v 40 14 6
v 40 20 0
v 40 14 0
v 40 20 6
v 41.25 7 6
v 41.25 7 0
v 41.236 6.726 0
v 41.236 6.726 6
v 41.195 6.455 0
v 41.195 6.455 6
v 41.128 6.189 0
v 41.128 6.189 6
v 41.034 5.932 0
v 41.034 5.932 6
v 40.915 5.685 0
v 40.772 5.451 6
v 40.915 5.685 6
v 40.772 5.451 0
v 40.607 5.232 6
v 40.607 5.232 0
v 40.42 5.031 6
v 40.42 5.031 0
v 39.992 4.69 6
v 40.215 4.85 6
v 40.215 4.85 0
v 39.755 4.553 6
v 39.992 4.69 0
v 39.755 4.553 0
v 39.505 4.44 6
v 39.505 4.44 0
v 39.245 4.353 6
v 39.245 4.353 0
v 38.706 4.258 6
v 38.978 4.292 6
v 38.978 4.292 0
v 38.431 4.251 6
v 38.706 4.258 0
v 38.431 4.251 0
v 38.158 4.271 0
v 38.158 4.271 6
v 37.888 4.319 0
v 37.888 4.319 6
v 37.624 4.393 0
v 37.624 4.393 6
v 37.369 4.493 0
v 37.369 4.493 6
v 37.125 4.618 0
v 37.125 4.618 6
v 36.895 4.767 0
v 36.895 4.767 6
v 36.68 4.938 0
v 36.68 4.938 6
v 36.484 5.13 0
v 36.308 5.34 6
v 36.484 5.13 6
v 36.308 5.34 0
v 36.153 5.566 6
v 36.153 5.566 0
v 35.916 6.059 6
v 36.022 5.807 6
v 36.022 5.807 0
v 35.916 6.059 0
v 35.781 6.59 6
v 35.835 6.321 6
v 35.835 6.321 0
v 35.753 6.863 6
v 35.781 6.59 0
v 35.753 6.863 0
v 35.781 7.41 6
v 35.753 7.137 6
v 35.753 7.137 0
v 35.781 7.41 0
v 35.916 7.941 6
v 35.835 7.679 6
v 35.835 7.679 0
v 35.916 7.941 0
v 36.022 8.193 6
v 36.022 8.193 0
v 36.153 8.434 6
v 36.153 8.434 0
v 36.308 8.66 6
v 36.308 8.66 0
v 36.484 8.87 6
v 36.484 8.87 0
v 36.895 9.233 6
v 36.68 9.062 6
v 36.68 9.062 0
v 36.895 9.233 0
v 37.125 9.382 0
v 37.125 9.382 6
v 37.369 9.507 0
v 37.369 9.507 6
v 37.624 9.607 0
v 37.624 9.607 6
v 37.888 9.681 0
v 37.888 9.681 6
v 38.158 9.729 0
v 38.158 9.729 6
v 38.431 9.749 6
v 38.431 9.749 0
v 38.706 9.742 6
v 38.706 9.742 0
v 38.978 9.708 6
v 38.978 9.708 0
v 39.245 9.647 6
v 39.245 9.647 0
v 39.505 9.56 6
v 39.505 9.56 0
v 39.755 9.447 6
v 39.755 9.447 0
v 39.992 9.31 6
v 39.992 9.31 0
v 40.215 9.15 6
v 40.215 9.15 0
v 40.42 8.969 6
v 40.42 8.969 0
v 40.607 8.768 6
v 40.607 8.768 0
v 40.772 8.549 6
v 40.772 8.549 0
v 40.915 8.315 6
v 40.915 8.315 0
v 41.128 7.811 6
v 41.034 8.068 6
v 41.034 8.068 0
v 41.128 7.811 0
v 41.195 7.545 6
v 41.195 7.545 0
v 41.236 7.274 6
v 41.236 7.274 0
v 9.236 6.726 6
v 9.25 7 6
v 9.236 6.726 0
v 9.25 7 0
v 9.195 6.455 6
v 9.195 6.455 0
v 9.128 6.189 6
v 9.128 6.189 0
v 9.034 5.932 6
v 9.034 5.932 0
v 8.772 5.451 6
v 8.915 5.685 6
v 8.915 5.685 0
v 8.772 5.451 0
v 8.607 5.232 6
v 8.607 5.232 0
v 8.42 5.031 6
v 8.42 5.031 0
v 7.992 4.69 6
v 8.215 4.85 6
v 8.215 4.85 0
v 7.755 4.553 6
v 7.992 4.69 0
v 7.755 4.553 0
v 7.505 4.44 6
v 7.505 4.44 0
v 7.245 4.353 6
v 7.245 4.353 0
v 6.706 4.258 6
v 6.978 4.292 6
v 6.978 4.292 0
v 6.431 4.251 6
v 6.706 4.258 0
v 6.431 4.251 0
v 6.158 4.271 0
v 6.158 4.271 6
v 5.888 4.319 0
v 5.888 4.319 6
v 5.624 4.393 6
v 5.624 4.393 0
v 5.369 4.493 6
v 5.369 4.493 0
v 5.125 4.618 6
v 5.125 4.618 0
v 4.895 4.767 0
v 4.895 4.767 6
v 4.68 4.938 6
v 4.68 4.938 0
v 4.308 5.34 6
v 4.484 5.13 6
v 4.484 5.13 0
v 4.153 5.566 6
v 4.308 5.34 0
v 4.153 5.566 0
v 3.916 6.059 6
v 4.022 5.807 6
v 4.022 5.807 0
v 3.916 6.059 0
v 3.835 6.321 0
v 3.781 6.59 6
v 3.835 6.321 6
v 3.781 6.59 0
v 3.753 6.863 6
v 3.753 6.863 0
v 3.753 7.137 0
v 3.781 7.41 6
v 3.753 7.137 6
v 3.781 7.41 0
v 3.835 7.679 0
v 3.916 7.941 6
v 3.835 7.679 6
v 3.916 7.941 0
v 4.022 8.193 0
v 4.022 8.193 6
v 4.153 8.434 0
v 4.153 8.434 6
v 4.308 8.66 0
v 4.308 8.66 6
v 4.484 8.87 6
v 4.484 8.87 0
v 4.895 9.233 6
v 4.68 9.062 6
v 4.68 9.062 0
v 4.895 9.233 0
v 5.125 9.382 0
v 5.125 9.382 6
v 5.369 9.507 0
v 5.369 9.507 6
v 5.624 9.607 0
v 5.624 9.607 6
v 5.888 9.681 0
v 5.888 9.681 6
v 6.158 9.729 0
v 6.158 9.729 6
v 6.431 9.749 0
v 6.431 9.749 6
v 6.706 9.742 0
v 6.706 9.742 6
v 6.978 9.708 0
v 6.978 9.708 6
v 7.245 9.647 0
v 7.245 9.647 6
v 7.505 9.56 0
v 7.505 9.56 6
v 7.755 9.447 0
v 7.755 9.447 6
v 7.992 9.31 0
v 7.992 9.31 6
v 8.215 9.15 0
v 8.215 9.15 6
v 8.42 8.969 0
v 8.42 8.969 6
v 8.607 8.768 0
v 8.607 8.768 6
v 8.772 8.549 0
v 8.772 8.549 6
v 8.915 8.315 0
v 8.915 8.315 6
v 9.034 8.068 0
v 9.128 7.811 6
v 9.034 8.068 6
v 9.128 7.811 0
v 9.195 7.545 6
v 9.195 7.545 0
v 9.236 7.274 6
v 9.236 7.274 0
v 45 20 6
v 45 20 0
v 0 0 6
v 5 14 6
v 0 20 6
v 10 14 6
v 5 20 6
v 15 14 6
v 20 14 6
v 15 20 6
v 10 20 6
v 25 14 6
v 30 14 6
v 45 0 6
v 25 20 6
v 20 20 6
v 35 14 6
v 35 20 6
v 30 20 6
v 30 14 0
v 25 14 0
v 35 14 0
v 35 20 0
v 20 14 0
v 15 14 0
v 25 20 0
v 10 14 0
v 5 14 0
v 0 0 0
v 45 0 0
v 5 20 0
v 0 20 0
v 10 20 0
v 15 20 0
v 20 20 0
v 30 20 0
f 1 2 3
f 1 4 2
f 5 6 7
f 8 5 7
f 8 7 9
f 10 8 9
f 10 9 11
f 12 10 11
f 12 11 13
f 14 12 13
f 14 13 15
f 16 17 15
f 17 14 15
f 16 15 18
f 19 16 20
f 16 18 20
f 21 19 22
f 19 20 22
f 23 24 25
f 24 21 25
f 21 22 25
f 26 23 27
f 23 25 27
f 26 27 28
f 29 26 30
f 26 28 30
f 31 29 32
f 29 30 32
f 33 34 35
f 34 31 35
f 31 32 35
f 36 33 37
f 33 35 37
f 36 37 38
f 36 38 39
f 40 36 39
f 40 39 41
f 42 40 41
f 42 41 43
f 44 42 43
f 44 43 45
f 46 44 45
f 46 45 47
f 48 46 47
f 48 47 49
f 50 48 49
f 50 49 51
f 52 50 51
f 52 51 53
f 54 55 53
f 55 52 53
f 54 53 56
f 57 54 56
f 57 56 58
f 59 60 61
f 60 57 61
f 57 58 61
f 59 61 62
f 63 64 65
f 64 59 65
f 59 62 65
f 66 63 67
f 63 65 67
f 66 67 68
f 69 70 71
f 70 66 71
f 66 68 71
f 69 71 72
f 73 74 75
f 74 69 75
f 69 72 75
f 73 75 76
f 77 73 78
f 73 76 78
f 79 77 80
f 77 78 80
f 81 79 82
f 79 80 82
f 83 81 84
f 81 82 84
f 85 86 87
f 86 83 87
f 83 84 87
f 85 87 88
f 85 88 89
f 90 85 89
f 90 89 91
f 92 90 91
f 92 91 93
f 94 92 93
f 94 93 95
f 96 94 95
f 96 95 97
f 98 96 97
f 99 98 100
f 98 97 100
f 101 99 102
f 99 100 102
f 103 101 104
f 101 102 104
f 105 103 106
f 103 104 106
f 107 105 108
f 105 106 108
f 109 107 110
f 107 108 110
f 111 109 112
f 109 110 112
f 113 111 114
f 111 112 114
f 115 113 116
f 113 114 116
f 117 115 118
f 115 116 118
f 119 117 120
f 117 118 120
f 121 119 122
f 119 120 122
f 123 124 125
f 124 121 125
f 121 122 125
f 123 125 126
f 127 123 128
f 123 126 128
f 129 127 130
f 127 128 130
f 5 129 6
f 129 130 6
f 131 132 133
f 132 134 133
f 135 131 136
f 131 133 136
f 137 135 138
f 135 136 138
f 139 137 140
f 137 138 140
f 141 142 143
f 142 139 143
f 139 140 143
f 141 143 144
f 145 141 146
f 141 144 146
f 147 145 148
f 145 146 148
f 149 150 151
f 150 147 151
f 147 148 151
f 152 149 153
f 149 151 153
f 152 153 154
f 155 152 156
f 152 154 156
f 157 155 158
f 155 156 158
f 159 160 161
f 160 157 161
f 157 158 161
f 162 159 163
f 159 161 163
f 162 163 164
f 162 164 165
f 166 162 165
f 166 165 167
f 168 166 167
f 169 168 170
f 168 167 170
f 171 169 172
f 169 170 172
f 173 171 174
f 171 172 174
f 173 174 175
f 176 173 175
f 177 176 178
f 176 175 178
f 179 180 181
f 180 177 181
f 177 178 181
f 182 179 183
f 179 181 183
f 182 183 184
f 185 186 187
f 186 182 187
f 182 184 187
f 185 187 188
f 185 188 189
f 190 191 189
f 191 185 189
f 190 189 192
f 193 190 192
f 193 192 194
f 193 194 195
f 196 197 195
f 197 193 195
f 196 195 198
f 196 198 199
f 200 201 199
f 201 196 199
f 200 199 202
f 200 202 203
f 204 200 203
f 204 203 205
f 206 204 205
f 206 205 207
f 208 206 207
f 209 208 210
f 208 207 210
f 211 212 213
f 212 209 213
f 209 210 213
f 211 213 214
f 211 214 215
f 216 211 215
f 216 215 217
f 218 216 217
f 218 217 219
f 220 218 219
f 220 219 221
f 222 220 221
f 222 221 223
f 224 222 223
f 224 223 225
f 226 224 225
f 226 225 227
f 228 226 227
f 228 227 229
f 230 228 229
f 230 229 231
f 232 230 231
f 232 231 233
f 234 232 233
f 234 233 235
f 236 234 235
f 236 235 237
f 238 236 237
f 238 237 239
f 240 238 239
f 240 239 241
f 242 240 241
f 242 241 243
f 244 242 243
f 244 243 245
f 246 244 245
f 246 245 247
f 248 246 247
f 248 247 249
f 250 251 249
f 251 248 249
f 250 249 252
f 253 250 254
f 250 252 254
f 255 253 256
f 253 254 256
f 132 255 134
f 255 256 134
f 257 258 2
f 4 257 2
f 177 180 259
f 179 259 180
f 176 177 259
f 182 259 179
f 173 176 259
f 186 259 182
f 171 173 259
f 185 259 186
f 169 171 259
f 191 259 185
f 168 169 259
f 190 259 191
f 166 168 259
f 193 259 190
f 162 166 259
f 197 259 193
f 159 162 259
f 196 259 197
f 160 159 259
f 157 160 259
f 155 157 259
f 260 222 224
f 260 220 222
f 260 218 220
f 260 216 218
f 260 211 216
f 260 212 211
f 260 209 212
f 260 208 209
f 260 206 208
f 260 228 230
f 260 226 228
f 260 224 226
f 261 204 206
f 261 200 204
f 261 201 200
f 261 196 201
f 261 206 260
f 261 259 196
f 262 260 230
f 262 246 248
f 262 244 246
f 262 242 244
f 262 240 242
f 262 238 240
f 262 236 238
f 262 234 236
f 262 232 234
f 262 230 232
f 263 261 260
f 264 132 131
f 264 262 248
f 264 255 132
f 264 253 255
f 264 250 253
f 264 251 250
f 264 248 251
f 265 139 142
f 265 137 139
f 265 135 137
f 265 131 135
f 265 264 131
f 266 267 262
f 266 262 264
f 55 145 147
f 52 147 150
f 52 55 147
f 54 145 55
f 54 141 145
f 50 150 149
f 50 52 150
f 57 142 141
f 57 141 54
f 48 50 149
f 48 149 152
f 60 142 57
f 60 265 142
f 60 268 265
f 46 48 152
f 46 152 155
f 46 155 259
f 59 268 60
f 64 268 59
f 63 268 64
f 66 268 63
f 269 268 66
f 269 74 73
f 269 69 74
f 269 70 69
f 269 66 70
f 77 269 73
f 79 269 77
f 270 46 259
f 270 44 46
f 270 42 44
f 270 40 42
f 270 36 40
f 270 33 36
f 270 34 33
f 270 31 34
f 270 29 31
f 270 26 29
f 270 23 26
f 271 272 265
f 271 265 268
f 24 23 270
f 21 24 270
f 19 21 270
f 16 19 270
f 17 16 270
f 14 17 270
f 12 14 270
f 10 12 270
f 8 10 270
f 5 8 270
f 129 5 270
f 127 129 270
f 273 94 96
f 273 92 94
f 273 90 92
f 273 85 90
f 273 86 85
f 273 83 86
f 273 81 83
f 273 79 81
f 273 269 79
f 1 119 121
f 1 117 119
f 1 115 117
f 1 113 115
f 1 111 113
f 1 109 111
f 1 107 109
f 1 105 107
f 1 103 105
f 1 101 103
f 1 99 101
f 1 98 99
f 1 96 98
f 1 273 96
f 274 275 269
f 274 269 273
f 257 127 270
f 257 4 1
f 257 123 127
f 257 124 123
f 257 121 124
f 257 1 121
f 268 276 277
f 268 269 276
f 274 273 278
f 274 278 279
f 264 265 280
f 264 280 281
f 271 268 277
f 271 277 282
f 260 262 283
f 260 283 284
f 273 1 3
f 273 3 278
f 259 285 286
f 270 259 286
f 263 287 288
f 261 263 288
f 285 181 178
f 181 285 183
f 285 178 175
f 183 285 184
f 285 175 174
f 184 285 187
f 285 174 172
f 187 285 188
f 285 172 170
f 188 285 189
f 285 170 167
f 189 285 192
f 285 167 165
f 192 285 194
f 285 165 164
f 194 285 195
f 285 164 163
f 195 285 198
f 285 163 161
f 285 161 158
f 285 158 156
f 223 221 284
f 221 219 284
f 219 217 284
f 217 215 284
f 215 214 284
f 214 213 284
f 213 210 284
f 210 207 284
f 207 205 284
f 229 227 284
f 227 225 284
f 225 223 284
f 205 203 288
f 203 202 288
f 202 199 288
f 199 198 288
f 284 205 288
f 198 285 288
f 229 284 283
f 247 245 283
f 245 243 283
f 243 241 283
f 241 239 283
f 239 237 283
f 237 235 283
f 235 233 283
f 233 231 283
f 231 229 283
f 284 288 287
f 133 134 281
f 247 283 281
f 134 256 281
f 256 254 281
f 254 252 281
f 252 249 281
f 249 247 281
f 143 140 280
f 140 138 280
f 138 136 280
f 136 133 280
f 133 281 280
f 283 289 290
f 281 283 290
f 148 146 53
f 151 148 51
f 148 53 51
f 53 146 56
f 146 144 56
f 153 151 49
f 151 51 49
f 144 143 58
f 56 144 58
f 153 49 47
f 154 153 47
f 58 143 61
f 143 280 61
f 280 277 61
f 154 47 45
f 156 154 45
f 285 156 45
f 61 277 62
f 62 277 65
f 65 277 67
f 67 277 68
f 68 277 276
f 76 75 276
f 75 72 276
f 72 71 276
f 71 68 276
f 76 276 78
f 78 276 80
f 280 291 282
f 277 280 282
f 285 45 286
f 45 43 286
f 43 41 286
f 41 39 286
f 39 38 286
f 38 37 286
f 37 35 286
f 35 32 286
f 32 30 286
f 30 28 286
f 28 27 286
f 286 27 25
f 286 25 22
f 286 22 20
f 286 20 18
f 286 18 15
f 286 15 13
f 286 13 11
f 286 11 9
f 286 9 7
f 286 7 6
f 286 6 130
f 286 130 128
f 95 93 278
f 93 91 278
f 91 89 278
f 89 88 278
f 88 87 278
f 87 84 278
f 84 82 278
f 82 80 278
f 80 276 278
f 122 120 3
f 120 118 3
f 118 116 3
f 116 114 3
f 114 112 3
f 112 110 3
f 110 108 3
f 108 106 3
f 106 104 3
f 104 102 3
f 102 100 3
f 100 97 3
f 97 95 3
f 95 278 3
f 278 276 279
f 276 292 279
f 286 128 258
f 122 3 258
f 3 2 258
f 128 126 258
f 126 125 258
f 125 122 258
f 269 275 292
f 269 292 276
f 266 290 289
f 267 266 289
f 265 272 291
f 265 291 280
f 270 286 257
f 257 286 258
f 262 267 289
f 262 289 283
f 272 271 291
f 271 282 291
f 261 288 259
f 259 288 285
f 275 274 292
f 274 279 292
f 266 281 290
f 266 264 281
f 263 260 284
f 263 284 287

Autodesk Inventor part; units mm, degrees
ref_plane "YZ Plane" through (0, 0, 0) normal (1, 0, 0) x (0, 1, 0)
ref_plane "XZ Plane" through (0, 0, 0) normal (0, 1, 0) x (-1, 0, 0)
ref_plane "XY Plane" through (0, 0, 0) normal (0, 0, 1) x (1, 0, 0)
sketch "Sketch1" plane through (0, 0, 0) normal (0, 0, 1) x (1, 0, 0)
  line L0 (0, 0) -> (45, 0)
  line L1 (45, 0) -> (45, 20)
  line L2 (45, 20) -> (0, 20)
  line L3 (0, 20) -> (0, 0)
  circle A0 centre (6.5, 7) radius 2.75
  circle A1 centre (38.5, 7) radius 2.75
  dimension "d0" = 45
  dimension "d1" = 20
  dimension "d5" = 5.5
  dimension "d6" = 5.5
extrude "Extrusion1" add sketch "Sketch1" along normal blind 6
sketch "Sketch2" plane through (0, 0, 6) normal (0, 0, 1) x (1, 0, 0)
  line L0 (45, 20) -> (0, 20) projected
  line L1 (0, 20) -> (5, 20)
  line L2 (5, 20) -> (10, 20)
  line L3 (10, 20) -> (10, 14)
  line L4 (10, 14) -> (5, 14)
  line L5 (5, 14) -> (5, 20)
  point P0 (0, 0)
  dimension "d9" = 5
  dimension "d10" = 5
  dimension "d11" = 6
extrude "Extrusion2" cut sketch "Sketch2" against normal blind 6
pattern_linear "Rectangular Pattern1" count 4 spacing 10 along (1, 0, 0) of "Extrusion2"
properties part number "e_rail support"
